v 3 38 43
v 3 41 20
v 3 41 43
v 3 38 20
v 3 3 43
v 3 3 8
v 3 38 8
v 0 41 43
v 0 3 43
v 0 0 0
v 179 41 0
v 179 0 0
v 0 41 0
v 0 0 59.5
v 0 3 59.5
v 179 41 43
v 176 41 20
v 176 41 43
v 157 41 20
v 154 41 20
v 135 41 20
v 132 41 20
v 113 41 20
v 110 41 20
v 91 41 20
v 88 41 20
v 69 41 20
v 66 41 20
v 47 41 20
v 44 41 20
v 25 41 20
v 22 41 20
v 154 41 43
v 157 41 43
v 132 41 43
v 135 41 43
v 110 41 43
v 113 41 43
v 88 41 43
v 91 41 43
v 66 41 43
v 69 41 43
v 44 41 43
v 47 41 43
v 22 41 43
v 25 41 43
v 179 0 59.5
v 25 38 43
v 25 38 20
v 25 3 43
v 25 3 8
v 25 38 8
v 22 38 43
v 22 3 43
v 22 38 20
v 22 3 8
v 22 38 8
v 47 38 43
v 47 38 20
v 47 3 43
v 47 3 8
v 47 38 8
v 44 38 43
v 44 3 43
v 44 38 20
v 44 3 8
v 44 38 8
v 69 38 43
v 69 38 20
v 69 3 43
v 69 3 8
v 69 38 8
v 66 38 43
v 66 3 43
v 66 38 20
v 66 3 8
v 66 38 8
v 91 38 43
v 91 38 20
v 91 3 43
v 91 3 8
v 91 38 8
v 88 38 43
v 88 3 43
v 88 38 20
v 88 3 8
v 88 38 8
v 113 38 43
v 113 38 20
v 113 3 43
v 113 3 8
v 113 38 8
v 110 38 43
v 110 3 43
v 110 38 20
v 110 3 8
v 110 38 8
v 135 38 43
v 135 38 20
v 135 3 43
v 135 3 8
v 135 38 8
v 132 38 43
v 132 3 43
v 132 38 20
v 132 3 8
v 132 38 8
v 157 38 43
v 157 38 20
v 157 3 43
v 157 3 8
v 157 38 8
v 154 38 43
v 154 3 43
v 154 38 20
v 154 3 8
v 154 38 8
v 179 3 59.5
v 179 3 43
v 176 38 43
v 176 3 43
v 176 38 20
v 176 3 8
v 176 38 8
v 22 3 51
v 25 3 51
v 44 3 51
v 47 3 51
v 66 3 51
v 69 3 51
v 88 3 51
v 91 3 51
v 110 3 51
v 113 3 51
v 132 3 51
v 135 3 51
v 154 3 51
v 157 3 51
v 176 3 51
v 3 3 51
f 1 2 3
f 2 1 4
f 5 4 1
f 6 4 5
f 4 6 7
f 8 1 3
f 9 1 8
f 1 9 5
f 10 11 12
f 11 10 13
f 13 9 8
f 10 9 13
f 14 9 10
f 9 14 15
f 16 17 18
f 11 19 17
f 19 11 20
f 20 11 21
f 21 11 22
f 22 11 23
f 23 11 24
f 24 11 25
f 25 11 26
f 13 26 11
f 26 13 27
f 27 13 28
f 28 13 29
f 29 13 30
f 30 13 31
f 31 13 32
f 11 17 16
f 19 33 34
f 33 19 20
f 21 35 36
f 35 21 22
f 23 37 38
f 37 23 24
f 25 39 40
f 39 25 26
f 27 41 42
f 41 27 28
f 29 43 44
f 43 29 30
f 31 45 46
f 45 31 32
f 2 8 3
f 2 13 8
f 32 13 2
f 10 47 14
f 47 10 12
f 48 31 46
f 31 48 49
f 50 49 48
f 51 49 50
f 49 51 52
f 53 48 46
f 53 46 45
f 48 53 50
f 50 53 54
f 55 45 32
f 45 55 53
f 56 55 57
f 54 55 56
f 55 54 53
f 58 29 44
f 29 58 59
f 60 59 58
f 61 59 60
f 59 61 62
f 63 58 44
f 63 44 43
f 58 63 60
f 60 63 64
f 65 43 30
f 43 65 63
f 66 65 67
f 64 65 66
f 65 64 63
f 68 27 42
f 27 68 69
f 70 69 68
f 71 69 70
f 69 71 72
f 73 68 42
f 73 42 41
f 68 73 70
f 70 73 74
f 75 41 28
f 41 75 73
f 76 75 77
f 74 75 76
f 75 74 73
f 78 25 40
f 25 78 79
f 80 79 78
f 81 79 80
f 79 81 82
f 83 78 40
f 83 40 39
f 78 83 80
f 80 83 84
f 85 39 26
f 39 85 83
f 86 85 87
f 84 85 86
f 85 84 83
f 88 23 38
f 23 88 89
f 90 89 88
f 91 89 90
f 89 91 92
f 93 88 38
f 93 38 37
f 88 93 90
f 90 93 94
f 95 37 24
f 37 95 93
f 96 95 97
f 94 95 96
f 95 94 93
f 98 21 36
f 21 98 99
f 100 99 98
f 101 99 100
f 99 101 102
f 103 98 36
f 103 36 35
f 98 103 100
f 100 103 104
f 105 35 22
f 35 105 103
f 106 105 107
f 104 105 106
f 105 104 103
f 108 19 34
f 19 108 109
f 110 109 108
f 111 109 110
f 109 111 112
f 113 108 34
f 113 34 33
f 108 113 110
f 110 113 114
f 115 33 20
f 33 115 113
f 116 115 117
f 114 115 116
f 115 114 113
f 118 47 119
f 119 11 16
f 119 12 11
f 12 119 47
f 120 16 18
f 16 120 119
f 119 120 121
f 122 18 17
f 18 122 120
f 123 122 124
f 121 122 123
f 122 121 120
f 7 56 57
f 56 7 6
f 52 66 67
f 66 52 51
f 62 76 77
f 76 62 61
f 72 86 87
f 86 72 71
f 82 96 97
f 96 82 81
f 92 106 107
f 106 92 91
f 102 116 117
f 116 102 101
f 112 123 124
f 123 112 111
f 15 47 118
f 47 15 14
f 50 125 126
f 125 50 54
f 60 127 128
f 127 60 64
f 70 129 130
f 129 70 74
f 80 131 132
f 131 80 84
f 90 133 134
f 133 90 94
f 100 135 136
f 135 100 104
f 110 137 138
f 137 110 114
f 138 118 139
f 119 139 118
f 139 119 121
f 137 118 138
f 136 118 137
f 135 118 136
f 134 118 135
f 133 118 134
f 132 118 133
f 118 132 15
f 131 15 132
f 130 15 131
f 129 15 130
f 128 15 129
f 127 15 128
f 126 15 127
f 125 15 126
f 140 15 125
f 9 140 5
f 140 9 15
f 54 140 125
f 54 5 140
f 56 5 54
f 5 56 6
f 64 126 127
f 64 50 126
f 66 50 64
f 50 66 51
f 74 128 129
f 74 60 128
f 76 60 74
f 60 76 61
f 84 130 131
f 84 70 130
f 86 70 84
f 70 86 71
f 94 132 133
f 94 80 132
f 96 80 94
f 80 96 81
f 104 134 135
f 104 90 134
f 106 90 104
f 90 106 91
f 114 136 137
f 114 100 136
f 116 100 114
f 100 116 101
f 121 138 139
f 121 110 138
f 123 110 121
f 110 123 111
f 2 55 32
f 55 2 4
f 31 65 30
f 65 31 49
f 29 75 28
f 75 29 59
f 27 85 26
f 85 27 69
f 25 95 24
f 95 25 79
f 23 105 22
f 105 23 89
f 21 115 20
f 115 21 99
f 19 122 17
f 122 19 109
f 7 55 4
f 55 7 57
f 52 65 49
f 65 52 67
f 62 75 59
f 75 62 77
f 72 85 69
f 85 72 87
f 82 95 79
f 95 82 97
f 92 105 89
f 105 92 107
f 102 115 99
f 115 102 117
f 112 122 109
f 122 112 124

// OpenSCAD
// Retro Game Cartridge Display Stand
// Holds SNES / Game Boy / N64 cartridges upright
// PLA — 0.2mm, 3 walls, 15% infill, no supports
// Each slot is labeled with embossed logo area

SLOTS       = 8;
// Cartridge sizes (mm) — SNES ≈ 55x128x18
CART_W      = 56;
CART_H      = 55;   // How high cart sticks out above holder
CART_T      = 19;
SLOT_DEPTH  = 35;   // How deep the slot grips the cart
WALL_T      = 3.0;
BASE_H      = 8;
LABEL_H     = 8;    // Embossed label band height

total_W = SLOTS * (CART_T + WALL_T) + WALL_T;
total_D = SLOT_DEPTH + WALL_T * 2;
body_H  = SLOT_DEPTH + BASE_H;

module label_band(w, h) {
    // Recessed area for painting/labeling each slot
    translate([1, total_D - WALL_T - 1, BASE_H + 5])
        cube([w - 2, 2, h]);
}

module slot_body(i) {
    x = WALL_T + i * (CART_T + WALL_T);
    translate([x, WALL_T, BASE_H])
        cube([CART_T, SLOT_DEPTH, body_H]);
}

difference() {
    union() {
        // Base slab
        cube([total_W, total_D, BASE_H]);
        // Back wall
        translate([0, 0, 0])
            cube([total_W, WALL_T, body_H + CART_H * 0.3]);
        // Side walls + dividers
        for (i = [0 : SLOTS])
            translate([i * (CART_T + WALL_T), 0, 0])
                cube([WALL_T, total_D, body_H]);
        // Front lip (keeps carts from sliding out)
        translate([0, total_D - WALL_T, 0])
            cube([total_W, WALL_T, BASE_H + 12]);
    }
    // Slot cutouts
    for (i = [0 : SLOTS - 1])
        slot_body(i);
    // Label recesses
    for (i = [0 : SLOTS - 1]) {
        x = WALL_T + i * (CART_T + WALL_T);
        translate([x, 0, BASE_H + 5])
            label_band(CART_T, LABEL_H);
    }
}
